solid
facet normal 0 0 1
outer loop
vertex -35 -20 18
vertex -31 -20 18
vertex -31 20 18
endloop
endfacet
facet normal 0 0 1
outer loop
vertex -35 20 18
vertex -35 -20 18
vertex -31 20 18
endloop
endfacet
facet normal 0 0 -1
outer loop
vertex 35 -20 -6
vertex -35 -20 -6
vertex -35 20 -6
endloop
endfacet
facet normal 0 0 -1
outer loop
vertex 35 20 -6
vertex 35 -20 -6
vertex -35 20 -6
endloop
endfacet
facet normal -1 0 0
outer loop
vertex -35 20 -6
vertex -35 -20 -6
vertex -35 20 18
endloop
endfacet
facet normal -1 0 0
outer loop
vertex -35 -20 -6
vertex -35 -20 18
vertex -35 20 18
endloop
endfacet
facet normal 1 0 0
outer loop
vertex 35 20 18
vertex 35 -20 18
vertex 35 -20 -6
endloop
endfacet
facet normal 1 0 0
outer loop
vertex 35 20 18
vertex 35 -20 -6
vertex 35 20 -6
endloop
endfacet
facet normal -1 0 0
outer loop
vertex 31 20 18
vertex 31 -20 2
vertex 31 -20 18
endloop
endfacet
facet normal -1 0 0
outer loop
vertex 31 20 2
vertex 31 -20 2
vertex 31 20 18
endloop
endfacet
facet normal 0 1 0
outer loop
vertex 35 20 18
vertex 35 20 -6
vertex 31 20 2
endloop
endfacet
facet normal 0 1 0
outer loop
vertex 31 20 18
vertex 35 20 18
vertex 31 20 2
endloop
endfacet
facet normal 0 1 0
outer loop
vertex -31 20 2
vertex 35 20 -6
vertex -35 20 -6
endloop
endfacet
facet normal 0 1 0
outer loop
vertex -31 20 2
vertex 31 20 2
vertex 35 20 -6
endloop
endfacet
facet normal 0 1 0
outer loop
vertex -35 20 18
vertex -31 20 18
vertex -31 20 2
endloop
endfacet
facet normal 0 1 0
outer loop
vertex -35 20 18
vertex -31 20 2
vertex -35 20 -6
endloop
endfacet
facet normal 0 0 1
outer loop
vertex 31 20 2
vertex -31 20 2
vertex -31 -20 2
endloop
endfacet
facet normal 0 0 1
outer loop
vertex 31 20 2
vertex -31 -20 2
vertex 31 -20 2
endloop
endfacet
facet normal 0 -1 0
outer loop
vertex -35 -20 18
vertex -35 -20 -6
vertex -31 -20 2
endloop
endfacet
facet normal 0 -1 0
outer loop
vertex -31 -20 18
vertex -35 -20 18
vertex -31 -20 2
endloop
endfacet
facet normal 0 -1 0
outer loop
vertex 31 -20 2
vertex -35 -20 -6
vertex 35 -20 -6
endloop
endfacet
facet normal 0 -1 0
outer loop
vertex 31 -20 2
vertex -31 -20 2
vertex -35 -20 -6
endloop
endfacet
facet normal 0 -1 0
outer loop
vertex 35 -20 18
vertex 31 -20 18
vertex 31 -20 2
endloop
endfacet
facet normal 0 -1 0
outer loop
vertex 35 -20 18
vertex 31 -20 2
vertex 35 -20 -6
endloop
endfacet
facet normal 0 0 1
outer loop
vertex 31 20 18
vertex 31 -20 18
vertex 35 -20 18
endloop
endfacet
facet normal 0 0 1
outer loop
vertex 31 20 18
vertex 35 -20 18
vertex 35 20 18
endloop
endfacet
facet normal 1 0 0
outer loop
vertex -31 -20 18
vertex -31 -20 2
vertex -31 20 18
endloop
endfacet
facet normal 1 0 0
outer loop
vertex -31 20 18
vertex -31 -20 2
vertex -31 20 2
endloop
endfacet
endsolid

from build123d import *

# Parameters (mm, degrees)
F0_W     = 66
F0_H     = 40
F1_DEPTH = 2
F2_DEPTH = 2
F3_W     = 2
F3_H     = 40
F4_DEPTH = 16
F5_DEPTH = 2
F6_DEPTH = 2
F7_DEPTH = 4
F8_DEPTH = 2


with BuildPart() as f1:
    # F0 (on Top) → F1 (new body)
    with BuildSketch(Plane.XY):
        Rectangle(F0_W, F0_H)
    extrude(amount=F1_DEPTH)

    # F0 (on Top) → F2 (join)
    with BuildSketch(Plane.XY):
        Rectangle(F0_W, F0_H)
    extrude(amount=F2_DEPTH)

    # F3 (on face) → F4 (join)
    with BuildSketch(Plane.XY.offset(2)):
        with Locations((-32, 0)):
            Rectangle(F3_W, F3_H)
        with Locations((32, 0)):
            Rectangle(F3_W, F3_H)
    extrude(amount=F4_DEPTH)

    # F5 (add): a face of the model
    f5_faces = [f1.faces().sort_by_distance(p)[0] for p in [
        (33, 0, 9),
    ]]
    extrude(f5_faces, amount=F5_DEPTH)

    # F6 (add): a face of the model
    f6_faces = [f1.faces().sort_by_distance(p)[0] for p in [
        (-33, 0, 9),
    ]]
    extrude(f6_faces, amount=F6_DEPTH)

    # F7 (add): a face of the model
    f7_faces = [f1.faces().sort_by_distance(p)[0] for p in [
        (0, 0, 0),
    ]]
    extrude(f7_faces, amount=F7_DEPTH)

    # F8 (add): a face of the model
    f8_faces = [f1.faces().sort_by_distance(p)[0] for p in [
        (0, 0, -4),
    ]]
    extrude(f8_faces, amount=F8_DEPTH)


solid = f1.part
